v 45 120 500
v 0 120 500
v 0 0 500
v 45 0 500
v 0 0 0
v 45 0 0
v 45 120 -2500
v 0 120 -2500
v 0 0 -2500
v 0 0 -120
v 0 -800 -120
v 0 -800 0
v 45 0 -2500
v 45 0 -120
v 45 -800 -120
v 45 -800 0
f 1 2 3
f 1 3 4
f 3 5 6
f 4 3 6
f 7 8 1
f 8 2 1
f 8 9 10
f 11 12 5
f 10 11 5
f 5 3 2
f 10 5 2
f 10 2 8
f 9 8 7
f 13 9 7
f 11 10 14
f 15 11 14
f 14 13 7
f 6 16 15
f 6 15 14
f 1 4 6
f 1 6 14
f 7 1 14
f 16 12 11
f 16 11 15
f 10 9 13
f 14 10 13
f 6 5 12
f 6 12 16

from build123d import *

# Parameters (mm, degrees)
F0_W          = 45
F0_H          = 120
F1_DEPTH      = 800
F2_W          = 45
F2_H          = 120
F3_DEPTH      = 500
F3_DEPTH_BACK = 2500


with BuildPart() as f1:
    # F0 (on Front) → F1 (new body)
    with BuildSketch(Plane.XZ):
        with Locations((22.5, -60)):
            Rectangle(F0_W, F0_H)
    extrude(amount=F1_DEPTH)

    # F2 (on Top) → F3 (join, two sides)
    with BuildSketch(Plane.XY) as f3_sk:
        with Locations((22.5, 60)):
            Rectangle(F2_W, F2_H)
    extrude(amount=F3_DEPTH)
    extrude(f3_sk.sketch, amount=-F3_DEPTH_BACK)


solid = f1.part
